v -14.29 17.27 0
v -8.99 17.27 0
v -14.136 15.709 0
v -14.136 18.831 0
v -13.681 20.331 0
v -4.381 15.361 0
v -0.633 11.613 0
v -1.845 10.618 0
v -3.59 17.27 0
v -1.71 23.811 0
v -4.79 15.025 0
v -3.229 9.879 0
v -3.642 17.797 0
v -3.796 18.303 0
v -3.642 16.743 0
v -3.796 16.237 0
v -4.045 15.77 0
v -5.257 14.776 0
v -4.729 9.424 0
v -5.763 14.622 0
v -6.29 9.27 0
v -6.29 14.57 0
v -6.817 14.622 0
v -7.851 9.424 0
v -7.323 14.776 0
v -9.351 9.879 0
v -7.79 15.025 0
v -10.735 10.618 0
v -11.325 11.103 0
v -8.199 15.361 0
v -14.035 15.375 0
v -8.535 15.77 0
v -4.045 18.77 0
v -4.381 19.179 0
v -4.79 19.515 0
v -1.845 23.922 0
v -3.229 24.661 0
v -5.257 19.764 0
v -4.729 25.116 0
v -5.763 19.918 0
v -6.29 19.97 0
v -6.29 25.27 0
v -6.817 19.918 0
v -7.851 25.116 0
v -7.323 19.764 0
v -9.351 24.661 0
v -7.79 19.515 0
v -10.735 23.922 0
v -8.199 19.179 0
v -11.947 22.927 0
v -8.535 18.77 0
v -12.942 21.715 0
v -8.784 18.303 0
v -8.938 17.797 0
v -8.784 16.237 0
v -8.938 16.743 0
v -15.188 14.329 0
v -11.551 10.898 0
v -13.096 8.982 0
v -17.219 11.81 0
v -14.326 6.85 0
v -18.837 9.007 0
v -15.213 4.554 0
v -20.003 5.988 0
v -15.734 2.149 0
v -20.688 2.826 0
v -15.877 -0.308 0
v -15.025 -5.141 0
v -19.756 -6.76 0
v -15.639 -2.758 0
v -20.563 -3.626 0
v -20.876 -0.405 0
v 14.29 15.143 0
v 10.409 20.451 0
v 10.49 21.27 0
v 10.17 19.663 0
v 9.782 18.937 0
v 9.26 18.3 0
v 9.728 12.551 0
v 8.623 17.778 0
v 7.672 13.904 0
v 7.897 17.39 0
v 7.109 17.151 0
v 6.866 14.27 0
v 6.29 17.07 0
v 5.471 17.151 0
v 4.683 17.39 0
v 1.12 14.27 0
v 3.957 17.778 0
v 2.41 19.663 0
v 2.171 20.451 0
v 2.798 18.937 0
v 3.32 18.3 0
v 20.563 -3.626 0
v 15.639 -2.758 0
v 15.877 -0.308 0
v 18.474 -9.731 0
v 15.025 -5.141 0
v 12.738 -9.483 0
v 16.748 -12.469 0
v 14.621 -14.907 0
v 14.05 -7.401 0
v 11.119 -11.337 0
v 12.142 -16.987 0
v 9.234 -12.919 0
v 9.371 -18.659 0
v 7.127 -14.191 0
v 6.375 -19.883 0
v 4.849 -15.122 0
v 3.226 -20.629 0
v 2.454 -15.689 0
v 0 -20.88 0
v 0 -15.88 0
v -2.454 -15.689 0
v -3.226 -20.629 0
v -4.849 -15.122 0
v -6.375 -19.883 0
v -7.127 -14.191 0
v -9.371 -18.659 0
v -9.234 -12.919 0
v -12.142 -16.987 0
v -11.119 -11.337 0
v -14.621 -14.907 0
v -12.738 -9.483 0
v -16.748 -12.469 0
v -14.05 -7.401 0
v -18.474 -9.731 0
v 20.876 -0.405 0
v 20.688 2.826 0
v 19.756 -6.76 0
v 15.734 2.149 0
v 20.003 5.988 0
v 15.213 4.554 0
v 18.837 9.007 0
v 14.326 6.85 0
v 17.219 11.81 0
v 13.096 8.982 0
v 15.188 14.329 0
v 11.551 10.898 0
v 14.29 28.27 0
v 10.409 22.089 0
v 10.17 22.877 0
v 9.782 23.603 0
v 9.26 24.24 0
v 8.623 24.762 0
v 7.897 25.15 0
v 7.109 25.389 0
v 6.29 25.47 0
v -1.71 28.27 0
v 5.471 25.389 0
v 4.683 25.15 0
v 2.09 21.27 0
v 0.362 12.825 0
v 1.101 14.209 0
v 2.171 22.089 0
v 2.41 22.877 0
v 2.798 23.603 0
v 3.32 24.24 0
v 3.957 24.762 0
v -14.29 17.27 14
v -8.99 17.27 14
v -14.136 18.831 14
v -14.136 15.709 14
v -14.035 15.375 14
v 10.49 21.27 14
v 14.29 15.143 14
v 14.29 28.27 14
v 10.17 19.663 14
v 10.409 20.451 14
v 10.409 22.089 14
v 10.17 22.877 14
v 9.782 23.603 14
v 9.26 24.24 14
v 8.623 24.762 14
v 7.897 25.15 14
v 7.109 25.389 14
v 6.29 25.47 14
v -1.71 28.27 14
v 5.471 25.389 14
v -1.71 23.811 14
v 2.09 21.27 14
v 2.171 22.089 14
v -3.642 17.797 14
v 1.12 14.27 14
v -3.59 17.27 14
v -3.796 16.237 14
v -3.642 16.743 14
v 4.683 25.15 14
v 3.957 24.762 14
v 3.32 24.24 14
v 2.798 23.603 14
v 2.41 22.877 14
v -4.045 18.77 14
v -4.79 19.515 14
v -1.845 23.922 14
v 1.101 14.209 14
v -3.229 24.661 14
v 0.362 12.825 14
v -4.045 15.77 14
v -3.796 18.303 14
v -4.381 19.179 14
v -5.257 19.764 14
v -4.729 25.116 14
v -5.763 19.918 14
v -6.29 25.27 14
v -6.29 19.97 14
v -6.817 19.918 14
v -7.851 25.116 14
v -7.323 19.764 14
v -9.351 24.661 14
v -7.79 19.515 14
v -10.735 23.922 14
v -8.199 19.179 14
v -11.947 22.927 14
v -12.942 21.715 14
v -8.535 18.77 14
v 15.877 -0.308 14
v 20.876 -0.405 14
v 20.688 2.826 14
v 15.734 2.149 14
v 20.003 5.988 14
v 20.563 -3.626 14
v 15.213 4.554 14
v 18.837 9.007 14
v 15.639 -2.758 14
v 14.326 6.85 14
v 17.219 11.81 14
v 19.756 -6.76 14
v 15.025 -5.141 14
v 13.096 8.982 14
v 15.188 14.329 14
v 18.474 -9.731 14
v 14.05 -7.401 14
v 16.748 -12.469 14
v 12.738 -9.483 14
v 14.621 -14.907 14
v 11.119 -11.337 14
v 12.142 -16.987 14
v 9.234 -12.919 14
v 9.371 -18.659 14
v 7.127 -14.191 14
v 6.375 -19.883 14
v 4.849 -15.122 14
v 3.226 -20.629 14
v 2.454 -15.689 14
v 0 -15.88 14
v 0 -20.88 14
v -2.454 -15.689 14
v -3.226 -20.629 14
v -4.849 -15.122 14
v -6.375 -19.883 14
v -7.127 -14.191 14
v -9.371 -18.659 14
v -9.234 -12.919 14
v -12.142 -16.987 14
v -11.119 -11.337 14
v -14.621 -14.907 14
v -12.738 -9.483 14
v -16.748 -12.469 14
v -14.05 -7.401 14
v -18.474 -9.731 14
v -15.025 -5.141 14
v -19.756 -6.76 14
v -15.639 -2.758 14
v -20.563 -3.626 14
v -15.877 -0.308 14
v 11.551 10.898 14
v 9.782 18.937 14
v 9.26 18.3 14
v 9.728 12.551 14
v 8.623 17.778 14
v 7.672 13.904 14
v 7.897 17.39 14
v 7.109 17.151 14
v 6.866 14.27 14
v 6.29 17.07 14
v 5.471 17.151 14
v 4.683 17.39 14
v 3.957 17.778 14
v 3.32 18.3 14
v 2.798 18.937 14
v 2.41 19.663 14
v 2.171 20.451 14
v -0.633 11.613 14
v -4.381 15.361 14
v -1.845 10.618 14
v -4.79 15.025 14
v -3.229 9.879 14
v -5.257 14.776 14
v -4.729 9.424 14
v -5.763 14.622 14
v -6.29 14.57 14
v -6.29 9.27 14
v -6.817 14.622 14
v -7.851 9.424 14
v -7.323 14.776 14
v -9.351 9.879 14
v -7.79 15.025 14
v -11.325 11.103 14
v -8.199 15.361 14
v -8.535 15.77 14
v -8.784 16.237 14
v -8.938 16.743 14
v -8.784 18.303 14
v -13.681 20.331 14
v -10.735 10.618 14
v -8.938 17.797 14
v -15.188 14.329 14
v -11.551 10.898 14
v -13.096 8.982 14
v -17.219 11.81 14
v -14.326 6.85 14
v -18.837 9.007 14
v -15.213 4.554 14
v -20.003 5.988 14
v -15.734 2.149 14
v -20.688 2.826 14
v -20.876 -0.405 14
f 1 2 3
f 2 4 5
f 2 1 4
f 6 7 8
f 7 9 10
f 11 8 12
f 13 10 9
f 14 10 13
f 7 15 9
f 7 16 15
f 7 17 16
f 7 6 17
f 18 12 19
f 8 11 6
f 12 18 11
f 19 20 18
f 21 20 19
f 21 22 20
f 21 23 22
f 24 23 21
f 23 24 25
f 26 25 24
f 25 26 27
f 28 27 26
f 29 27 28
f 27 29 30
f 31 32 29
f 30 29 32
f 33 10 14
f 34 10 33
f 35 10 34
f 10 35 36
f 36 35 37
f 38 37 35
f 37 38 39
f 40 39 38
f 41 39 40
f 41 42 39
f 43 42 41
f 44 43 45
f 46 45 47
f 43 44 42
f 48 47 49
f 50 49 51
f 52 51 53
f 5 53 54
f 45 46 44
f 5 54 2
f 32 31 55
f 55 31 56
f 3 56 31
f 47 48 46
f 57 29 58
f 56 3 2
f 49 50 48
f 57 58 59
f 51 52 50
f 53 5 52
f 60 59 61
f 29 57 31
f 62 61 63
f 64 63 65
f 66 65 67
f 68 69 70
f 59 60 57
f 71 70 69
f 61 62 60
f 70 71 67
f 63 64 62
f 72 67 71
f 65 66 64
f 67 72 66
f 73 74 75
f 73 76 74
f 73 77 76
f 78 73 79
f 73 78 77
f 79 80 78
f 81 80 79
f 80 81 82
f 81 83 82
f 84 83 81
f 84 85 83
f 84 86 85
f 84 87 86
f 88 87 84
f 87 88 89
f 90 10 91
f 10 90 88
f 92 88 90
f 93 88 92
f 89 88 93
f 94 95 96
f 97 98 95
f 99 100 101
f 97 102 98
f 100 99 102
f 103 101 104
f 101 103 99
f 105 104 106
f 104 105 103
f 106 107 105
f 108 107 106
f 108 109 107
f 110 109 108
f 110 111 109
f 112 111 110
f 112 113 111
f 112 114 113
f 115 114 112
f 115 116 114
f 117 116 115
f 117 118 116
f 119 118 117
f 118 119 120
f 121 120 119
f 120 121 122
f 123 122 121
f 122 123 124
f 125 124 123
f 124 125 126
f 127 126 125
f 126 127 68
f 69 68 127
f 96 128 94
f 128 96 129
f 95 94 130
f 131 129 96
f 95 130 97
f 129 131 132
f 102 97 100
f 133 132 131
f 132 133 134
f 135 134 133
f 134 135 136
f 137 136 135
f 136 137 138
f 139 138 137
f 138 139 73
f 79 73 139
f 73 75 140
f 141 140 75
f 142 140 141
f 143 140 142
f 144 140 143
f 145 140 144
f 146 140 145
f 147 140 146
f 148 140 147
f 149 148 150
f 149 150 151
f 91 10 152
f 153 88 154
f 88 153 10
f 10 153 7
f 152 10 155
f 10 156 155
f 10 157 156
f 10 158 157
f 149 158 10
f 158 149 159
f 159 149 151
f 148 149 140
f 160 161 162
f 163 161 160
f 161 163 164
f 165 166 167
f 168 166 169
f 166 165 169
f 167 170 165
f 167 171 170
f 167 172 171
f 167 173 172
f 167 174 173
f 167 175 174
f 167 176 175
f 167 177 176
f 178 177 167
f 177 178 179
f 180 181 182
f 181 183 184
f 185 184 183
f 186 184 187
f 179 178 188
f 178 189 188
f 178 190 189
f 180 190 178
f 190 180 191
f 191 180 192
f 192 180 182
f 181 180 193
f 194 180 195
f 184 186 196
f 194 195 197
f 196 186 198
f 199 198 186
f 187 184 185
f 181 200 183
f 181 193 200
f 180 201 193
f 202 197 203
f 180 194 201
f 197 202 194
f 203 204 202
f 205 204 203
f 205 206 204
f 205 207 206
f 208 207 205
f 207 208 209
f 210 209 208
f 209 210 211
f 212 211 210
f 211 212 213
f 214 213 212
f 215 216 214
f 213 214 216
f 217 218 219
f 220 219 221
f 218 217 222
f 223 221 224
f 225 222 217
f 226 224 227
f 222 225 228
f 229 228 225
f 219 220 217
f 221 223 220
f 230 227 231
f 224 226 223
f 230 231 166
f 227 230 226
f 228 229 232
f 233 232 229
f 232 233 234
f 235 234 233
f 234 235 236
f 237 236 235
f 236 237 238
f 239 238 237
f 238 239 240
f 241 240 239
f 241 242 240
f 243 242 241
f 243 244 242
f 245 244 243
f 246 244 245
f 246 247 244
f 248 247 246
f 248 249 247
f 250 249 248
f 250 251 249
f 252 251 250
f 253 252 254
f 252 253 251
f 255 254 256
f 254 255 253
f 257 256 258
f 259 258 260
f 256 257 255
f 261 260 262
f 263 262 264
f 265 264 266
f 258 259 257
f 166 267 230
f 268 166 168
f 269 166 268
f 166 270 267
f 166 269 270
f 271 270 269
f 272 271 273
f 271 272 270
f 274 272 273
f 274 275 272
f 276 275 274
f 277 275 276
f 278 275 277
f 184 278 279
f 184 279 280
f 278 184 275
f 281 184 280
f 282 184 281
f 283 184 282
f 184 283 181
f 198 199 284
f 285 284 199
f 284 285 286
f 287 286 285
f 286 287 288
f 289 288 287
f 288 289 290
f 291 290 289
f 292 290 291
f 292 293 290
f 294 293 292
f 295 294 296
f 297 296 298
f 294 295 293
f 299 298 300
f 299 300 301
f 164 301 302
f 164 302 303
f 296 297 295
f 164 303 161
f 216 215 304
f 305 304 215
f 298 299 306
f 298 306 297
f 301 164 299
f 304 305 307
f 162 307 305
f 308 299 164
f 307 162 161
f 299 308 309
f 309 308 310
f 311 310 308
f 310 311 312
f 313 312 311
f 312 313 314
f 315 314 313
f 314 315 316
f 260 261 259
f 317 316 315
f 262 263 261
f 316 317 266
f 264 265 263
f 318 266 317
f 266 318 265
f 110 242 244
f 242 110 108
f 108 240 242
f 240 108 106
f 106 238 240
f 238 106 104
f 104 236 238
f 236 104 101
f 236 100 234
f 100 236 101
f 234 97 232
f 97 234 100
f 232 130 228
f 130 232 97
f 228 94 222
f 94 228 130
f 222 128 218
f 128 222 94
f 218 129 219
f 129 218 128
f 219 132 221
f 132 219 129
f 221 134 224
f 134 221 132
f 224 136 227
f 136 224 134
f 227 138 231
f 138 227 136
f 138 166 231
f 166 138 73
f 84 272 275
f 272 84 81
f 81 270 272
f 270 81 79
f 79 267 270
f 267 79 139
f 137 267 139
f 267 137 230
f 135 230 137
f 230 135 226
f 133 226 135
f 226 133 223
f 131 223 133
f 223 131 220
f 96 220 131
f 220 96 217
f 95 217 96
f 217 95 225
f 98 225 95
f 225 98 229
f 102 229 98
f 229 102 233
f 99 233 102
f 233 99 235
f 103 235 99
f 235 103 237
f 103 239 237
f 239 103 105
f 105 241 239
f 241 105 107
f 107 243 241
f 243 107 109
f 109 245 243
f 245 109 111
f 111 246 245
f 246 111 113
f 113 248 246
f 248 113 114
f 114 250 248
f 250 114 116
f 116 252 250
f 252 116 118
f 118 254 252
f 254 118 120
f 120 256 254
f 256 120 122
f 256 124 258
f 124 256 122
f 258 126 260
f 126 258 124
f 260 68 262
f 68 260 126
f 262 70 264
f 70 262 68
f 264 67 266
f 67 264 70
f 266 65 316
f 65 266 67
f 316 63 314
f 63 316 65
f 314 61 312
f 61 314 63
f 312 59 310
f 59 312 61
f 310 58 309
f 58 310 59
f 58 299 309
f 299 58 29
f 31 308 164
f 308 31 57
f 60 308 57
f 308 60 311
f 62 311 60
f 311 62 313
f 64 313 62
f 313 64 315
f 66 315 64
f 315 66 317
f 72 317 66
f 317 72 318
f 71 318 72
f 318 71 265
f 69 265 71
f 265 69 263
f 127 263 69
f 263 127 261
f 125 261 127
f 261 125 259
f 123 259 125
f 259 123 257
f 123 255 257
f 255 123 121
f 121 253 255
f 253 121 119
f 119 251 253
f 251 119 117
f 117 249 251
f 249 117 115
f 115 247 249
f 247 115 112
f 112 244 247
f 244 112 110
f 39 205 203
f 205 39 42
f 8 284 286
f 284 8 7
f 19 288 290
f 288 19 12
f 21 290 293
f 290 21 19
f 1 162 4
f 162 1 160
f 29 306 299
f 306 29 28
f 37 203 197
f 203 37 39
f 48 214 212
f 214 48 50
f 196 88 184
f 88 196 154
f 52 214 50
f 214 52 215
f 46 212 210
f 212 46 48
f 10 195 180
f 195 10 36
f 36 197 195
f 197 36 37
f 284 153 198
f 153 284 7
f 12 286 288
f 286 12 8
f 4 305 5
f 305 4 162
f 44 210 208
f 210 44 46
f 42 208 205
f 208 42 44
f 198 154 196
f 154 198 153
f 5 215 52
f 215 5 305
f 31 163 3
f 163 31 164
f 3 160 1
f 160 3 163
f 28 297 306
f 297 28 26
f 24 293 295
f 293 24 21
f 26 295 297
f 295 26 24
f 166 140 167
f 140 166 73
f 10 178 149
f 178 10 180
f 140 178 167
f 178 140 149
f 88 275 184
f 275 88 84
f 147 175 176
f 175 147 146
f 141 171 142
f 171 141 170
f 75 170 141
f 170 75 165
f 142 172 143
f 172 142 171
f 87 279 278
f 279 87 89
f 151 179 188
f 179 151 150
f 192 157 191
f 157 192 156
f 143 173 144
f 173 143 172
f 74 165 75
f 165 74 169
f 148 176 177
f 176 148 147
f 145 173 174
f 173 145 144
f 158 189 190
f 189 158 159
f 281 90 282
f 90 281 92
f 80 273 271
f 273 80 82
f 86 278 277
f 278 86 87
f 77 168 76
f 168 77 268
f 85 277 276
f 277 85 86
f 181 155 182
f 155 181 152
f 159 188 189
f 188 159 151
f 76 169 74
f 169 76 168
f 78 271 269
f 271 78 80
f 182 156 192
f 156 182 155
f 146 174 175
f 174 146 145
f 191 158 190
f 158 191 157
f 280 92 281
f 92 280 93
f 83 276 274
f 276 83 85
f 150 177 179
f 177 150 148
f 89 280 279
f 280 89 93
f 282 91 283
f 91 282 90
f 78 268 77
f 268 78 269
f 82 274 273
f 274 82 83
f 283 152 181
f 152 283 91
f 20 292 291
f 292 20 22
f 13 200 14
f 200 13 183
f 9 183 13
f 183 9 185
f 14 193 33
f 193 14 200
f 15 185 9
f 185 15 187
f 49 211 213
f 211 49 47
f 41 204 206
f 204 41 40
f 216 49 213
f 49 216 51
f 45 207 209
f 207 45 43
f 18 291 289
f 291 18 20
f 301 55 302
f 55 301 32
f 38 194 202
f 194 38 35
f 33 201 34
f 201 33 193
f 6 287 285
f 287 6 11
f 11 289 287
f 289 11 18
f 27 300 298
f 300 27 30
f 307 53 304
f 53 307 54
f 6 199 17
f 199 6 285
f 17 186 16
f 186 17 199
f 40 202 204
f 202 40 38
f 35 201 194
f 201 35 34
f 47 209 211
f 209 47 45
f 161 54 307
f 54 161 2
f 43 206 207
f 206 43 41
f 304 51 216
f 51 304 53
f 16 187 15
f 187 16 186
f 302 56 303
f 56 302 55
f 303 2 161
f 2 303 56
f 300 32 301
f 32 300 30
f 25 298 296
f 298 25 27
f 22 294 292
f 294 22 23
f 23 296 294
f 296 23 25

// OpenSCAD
$fn = 32;

// ----------------------------------------------------------------------
// Pipe clamp: 41.76 mm ring, 5 mm wall, 14 mm wide
// ----------------------------------------------------------------------

// --- parameters (mm) ---
outer_r = 20.88;          // clamp outside radius
inner_r = 15.88;          // pipe bore radius
band = 5;                 // band thickness
clamp_w = 14;             // clamp width
opening = 40;             // opening angle between the ends
lug_w = 16;               // lug width
lug_len = 14;             // lug length
bolt_d = 8.4;             // bolt hole
knuckle_d = 16;           // hinge knuckle diameter
pin_d = 5.4;              // hinge pin hole

clamp_profile = [[-7.141, 19.621], [-10.087, 18.282], [-12.791, 16.503], [-15.188, 14.329], [-17.219, 11.81], [-18.837, 9.007], [-20.003, 5.988], [-20.688, 2.826], [-20.876, -0.405], [-20.563, -3.626], [-19.756, -6.76], [-18.474, -9.731], [-16.748, -12.469], [-14.621, -14.907], [-12.142, -16.987], [-9.371, -18.659], [-6.375, -19.883], [-3.226, -20.629], [0, -20.88], [3.226, -20.629], [6.375, -19.883], [9.371, -18.659], [12.142, -16.987], [14.621, -14.907], [16.748, -12.469], [18.474, -9.731], [19.756, -6.76], [20.563, -3.626], [20.876, -0.405], [20.688, 2.826], [20.003, 5.988], [18.837, 9.007], [17.219, 11.81], [15.188, 14.329], [12.791, 16.503], [10.087, 18.282], [7.141, 19.621], [5.431, 14.922], [7.672, 13.904], [9.728, 12.551], [11.551, 10.898], [13.096, 8.982], [14.326, 6.85], [15.213, 4.554], [15.734, 2.149], [15.877, -0.308], [15.639, -2.758], [15.025, -5.141], [14.05, -7.401], [12.738, -9.483], [11.119, -11.337], [9.234, -12.919], [7.127, -14.191], [4.849, -15.122], [2.454, -15.689], [0, -15.88], [-2.454, -15.689], [-4.849, -15.122], [-7.127, -14.191], [-9.234, -12.919], [-11.119, -11.337], [-12.738, -9.483], [-14.05, -7.401], [-15.025, -5.141], [-15.639, -2.758], [-15.877, -0.308], [-15.734, 2.149], [-15.213, 4.554], [-14.326, 6.85], [-13.096, 8.982], [-11.551, 10.898], [-9.728, 12.551], [-7.672, 13.904], [-5.431, 14.922]];

difference() {
  union() {
    linear_extrude(height = clamp_w) polygon(clamp_profile);
    /* hinge knuckle, sunk 2 mm into the band end */
    translate([-6.29, 17.27, 0]) cylinder(h = clamp_w, d = knuckle_d);
    /* bolt lug on the other end */
    translate([-1.71, 14.27, 0]) cube([lug_w, 14, clamp_w]);
  }
  translate([6.29, 21.27, -2.5]) cylinder(h = clamp_w + 5, d = bolt_d);
  translate([-6.29, 17.27, -2.5]) cylinder(h = clamp_w + 5, d = pin_d);
}
